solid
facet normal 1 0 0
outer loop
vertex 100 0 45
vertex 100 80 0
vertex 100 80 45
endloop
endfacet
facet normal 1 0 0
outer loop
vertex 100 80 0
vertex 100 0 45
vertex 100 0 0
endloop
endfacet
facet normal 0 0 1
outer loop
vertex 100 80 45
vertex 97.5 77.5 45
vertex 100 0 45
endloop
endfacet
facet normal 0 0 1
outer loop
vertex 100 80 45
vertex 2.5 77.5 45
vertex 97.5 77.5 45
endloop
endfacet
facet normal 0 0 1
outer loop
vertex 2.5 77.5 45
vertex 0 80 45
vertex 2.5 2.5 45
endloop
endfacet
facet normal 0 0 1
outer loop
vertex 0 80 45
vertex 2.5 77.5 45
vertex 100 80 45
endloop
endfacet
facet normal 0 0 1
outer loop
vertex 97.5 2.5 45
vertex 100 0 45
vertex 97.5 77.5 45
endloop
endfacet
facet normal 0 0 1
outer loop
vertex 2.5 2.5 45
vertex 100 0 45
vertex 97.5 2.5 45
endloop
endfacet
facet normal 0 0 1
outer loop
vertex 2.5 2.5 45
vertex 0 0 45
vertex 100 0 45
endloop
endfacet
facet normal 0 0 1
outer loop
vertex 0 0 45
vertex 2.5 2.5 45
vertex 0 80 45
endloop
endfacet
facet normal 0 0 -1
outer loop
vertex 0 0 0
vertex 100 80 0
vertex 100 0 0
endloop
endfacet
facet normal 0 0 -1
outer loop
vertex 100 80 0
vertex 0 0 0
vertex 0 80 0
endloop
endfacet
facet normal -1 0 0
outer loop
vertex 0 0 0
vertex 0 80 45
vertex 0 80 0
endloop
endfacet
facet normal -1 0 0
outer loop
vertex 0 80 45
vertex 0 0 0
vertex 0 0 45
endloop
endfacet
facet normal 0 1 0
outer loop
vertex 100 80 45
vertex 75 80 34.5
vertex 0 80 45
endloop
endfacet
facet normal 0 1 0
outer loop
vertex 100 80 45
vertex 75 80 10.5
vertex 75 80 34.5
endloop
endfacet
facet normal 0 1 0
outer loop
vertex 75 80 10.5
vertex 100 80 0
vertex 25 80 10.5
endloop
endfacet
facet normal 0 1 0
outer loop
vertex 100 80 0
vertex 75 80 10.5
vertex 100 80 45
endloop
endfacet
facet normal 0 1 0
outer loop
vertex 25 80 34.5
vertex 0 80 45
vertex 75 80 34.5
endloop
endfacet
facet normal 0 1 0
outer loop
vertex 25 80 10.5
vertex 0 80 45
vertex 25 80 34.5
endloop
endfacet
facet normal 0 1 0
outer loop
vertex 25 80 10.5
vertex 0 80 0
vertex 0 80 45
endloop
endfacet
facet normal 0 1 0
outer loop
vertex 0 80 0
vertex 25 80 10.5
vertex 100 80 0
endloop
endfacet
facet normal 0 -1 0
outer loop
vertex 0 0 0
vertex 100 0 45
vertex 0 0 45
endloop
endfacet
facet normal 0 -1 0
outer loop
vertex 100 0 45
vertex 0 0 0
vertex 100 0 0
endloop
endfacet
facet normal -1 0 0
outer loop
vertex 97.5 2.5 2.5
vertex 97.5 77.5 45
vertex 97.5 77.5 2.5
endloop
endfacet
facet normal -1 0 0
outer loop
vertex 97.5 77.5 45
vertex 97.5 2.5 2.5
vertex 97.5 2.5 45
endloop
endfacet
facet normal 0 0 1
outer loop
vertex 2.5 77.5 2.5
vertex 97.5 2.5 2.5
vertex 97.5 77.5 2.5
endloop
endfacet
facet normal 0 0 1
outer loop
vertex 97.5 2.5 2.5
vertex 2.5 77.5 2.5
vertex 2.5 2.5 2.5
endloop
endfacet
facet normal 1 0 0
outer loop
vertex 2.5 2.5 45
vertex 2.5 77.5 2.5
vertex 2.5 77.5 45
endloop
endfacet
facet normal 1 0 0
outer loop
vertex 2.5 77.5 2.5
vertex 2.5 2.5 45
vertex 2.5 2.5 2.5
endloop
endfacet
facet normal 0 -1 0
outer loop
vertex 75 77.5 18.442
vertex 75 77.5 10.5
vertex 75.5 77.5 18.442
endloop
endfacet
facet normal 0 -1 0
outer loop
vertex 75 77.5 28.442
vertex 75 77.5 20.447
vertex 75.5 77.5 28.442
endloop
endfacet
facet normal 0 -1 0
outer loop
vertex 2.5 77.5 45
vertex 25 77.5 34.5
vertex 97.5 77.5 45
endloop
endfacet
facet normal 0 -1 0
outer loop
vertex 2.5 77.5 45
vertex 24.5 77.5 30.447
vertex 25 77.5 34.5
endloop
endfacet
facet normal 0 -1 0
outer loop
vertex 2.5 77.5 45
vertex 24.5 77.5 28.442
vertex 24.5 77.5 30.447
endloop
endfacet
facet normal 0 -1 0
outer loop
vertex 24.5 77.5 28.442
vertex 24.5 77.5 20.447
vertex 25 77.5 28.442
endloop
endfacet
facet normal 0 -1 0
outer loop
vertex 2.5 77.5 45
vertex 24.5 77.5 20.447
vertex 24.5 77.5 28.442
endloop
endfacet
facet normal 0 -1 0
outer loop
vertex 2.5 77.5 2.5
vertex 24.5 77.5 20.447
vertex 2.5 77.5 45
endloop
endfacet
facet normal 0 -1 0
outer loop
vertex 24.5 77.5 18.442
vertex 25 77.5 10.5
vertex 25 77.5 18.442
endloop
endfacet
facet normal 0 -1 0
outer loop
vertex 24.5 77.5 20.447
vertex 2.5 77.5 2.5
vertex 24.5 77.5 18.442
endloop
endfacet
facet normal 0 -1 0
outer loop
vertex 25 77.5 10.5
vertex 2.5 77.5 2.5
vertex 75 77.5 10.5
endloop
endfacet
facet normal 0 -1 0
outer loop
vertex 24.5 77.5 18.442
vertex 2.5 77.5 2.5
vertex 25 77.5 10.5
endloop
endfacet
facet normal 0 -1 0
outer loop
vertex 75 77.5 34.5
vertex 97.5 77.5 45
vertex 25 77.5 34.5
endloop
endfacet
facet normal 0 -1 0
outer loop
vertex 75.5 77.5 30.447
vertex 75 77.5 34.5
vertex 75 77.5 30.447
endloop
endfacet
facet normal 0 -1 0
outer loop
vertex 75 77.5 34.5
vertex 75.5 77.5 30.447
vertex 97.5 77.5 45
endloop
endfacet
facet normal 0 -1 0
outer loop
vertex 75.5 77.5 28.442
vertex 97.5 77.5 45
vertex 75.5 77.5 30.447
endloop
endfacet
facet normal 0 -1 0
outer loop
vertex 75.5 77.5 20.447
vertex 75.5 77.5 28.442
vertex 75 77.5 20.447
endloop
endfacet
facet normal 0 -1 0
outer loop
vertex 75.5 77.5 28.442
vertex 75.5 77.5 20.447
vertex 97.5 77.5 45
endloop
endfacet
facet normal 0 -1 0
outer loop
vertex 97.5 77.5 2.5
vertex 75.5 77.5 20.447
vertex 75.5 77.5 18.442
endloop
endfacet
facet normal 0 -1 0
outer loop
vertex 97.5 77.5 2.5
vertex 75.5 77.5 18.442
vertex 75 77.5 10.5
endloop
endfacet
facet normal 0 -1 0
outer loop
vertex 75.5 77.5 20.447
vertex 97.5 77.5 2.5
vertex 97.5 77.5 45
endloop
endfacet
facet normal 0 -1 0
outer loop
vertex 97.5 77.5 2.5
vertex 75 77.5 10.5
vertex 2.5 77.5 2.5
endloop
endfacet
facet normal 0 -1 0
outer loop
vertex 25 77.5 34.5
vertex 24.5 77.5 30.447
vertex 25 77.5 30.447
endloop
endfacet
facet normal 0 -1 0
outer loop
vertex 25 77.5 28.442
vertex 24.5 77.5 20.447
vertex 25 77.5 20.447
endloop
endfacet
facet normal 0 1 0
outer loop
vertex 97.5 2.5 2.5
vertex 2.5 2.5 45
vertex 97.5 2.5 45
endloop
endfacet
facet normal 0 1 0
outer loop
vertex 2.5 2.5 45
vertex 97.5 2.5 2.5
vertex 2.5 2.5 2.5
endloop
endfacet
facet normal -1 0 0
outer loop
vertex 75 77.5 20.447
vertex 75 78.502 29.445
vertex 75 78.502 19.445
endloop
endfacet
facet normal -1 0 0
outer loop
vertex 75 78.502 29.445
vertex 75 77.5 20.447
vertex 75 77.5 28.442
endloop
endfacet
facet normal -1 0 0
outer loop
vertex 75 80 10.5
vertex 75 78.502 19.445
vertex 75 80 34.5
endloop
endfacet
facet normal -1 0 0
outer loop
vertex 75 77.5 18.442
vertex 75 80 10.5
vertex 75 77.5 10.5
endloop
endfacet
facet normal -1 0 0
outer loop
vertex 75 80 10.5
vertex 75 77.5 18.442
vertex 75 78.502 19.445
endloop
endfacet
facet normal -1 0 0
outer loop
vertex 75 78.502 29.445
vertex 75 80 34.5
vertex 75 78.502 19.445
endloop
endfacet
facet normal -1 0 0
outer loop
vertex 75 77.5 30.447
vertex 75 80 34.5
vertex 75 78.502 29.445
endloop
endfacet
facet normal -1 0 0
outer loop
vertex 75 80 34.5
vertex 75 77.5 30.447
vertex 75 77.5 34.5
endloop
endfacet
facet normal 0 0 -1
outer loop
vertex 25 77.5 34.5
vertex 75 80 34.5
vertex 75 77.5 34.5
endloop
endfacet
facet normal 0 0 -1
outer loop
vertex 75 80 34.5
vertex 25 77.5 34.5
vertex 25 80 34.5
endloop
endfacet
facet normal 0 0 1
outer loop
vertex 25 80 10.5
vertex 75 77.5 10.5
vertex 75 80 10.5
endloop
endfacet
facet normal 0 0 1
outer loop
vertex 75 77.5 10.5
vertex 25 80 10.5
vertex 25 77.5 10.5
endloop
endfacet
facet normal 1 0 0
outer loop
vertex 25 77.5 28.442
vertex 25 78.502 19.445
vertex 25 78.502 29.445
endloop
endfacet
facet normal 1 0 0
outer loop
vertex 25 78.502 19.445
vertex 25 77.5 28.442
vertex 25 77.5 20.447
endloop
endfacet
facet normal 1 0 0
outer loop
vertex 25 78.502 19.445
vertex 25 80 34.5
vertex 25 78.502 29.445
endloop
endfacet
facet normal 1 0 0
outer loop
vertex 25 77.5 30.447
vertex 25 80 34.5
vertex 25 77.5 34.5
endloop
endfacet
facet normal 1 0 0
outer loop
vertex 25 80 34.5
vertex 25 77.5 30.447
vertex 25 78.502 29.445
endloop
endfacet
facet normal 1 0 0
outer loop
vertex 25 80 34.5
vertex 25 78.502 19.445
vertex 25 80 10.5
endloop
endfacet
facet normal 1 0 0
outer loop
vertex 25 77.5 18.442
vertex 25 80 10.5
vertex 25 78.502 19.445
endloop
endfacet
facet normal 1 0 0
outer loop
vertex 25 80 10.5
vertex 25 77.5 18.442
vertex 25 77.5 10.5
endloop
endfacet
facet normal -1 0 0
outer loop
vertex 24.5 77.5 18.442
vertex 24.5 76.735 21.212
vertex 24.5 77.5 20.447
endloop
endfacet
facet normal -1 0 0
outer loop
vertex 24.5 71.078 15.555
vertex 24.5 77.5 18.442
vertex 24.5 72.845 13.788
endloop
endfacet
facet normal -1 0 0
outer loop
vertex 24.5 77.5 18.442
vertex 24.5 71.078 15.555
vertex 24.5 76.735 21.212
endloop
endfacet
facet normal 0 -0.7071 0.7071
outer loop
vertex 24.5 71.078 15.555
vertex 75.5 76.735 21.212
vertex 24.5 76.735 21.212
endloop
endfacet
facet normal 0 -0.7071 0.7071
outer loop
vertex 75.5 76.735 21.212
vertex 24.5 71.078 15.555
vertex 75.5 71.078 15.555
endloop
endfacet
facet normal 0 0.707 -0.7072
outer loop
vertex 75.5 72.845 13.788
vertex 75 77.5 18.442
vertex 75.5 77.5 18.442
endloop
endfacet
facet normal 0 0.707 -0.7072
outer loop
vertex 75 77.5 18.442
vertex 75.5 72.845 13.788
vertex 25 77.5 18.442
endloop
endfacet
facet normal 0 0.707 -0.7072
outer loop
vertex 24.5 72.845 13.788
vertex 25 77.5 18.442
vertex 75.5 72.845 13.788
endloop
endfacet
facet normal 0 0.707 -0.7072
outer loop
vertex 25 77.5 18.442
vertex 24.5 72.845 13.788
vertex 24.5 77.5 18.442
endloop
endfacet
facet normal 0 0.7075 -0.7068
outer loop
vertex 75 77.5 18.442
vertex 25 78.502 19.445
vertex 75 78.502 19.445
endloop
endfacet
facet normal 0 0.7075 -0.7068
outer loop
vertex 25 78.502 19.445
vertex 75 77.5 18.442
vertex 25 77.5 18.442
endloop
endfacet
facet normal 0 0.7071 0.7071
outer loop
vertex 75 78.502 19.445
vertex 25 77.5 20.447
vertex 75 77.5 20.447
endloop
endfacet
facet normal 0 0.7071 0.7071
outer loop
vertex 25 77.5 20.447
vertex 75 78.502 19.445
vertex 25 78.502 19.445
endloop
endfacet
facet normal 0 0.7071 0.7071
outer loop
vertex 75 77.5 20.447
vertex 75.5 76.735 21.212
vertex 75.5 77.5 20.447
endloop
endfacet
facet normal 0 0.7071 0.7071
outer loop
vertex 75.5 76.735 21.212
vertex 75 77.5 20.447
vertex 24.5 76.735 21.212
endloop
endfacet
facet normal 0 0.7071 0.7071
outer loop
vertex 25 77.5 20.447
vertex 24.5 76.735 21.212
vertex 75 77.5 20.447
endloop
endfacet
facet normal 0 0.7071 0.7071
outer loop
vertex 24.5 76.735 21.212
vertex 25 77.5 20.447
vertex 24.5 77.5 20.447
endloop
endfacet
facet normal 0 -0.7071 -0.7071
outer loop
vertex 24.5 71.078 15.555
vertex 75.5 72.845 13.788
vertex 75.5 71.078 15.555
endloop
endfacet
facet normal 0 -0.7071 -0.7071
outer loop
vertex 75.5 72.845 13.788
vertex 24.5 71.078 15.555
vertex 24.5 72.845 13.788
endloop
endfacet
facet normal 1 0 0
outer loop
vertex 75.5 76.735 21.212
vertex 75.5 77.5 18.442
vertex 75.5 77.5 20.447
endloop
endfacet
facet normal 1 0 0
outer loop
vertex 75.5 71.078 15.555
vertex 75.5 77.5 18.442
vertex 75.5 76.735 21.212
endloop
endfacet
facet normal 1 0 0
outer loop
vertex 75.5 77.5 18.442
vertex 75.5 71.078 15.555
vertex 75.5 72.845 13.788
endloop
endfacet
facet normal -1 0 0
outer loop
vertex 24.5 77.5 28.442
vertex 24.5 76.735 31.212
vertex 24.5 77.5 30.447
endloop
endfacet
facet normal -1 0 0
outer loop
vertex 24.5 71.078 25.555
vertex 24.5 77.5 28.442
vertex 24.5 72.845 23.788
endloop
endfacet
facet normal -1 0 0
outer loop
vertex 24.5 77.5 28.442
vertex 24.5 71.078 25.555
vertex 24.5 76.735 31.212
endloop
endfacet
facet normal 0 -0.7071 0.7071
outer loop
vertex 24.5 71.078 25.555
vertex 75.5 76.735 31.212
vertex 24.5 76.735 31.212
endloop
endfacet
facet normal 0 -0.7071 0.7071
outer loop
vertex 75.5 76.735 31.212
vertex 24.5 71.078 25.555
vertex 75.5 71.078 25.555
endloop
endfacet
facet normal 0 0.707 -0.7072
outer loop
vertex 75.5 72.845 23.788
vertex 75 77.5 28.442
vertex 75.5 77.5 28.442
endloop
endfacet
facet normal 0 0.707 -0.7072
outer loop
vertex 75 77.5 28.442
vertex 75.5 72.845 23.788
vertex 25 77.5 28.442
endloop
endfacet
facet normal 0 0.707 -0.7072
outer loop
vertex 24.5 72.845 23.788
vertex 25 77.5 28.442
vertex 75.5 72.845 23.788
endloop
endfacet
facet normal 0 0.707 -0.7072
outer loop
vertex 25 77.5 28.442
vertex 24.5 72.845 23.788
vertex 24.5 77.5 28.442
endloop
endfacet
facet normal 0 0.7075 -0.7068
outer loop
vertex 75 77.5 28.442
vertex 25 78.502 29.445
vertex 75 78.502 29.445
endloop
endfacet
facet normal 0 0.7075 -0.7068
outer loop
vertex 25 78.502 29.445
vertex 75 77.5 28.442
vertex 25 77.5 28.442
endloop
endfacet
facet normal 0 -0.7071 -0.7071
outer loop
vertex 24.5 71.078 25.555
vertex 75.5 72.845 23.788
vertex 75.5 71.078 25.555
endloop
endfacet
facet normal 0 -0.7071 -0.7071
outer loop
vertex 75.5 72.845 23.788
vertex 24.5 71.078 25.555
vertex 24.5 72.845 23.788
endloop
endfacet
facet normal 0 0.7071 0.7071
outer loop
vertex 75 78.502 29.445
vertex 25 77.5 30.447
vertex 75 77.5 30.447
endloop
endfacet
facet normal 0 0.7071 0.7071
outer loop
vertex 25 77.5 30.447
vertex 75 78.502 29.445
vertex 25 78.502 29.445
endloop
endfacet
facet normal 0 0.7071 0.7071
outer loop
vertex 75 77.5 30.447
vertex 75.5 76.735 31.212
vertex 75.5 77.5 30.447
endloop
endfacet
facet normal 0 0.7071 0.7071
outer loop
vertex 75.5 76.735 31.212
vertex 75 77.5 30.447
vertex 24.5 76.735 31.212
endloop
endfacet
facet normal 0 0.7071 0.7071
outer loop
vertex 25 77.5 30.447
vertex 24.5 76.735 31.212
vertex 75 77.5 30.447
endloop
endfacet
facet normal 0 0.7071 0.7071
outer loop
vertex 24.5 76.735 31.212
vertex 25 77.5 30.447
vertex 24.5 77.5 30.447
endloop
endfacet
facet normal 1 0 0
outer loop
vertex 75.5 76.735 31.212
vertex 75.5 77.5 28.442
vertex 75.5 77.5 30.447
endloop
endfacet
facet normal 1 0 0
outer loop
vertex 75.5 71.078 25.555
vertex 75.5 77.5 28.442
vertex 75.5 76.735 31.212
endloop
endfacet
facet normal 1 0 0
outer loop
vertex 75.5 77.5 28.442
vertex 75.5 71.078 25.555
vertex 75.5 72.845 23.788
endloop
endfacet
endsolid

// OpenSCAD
$fn = 32;

// ----------------------------------------------------------------------
// Vent box: louvers enclosure
// ----------------------------------------------------------------------

// --- parameters (mm) ---
box_l = 100;              // box length, X
box_w = 80;               // box width, Y
box_h = 45;               // box height, Z
wall_t = 2.5;             // shell wall thickness
win_l = 50;               // vent window width, X
win_h = 24;               // vent window height, Z
slat_t = 2.5;             // louver slat thickness
slat_d = 8;               // louver slat depth
slat_a = 45;              // louver slat angle, degrees
slat_pitch = 10;          // louver pitch
slat_yc = 74.79;          // slat centreline Y

win_z0 = (box_h - win_h) / 2;  // window lower edge Z
n_slats = 2;  // louver count
slat_z0 = win_z0 + (win_h - (n_slats - 1) * slat_pitch) / 2;

difference() {
  union() {
    difference() {
      cube([box_l, box_w, box_h]);
  translate([wall_t, wall_t, wall_t])
    cube([box_l - 2 * wall_t, box_w - 2 * wall_t, box_h]);
  translate([(box_l - win_l) / 2, box_w - wall_t - 1, win_z0])
    cube([win_l, wall_t + 2, win_h]);
    }
    for (i = [0 : n_slats - 1])
      translate([box_l / 2, slat_yc, slat_z0 + i * slat_pitch])
        rotate([slat_a, 0, 0])
          cube([win_l + 1, slat_d, slat_t], center = true);
  }
}
